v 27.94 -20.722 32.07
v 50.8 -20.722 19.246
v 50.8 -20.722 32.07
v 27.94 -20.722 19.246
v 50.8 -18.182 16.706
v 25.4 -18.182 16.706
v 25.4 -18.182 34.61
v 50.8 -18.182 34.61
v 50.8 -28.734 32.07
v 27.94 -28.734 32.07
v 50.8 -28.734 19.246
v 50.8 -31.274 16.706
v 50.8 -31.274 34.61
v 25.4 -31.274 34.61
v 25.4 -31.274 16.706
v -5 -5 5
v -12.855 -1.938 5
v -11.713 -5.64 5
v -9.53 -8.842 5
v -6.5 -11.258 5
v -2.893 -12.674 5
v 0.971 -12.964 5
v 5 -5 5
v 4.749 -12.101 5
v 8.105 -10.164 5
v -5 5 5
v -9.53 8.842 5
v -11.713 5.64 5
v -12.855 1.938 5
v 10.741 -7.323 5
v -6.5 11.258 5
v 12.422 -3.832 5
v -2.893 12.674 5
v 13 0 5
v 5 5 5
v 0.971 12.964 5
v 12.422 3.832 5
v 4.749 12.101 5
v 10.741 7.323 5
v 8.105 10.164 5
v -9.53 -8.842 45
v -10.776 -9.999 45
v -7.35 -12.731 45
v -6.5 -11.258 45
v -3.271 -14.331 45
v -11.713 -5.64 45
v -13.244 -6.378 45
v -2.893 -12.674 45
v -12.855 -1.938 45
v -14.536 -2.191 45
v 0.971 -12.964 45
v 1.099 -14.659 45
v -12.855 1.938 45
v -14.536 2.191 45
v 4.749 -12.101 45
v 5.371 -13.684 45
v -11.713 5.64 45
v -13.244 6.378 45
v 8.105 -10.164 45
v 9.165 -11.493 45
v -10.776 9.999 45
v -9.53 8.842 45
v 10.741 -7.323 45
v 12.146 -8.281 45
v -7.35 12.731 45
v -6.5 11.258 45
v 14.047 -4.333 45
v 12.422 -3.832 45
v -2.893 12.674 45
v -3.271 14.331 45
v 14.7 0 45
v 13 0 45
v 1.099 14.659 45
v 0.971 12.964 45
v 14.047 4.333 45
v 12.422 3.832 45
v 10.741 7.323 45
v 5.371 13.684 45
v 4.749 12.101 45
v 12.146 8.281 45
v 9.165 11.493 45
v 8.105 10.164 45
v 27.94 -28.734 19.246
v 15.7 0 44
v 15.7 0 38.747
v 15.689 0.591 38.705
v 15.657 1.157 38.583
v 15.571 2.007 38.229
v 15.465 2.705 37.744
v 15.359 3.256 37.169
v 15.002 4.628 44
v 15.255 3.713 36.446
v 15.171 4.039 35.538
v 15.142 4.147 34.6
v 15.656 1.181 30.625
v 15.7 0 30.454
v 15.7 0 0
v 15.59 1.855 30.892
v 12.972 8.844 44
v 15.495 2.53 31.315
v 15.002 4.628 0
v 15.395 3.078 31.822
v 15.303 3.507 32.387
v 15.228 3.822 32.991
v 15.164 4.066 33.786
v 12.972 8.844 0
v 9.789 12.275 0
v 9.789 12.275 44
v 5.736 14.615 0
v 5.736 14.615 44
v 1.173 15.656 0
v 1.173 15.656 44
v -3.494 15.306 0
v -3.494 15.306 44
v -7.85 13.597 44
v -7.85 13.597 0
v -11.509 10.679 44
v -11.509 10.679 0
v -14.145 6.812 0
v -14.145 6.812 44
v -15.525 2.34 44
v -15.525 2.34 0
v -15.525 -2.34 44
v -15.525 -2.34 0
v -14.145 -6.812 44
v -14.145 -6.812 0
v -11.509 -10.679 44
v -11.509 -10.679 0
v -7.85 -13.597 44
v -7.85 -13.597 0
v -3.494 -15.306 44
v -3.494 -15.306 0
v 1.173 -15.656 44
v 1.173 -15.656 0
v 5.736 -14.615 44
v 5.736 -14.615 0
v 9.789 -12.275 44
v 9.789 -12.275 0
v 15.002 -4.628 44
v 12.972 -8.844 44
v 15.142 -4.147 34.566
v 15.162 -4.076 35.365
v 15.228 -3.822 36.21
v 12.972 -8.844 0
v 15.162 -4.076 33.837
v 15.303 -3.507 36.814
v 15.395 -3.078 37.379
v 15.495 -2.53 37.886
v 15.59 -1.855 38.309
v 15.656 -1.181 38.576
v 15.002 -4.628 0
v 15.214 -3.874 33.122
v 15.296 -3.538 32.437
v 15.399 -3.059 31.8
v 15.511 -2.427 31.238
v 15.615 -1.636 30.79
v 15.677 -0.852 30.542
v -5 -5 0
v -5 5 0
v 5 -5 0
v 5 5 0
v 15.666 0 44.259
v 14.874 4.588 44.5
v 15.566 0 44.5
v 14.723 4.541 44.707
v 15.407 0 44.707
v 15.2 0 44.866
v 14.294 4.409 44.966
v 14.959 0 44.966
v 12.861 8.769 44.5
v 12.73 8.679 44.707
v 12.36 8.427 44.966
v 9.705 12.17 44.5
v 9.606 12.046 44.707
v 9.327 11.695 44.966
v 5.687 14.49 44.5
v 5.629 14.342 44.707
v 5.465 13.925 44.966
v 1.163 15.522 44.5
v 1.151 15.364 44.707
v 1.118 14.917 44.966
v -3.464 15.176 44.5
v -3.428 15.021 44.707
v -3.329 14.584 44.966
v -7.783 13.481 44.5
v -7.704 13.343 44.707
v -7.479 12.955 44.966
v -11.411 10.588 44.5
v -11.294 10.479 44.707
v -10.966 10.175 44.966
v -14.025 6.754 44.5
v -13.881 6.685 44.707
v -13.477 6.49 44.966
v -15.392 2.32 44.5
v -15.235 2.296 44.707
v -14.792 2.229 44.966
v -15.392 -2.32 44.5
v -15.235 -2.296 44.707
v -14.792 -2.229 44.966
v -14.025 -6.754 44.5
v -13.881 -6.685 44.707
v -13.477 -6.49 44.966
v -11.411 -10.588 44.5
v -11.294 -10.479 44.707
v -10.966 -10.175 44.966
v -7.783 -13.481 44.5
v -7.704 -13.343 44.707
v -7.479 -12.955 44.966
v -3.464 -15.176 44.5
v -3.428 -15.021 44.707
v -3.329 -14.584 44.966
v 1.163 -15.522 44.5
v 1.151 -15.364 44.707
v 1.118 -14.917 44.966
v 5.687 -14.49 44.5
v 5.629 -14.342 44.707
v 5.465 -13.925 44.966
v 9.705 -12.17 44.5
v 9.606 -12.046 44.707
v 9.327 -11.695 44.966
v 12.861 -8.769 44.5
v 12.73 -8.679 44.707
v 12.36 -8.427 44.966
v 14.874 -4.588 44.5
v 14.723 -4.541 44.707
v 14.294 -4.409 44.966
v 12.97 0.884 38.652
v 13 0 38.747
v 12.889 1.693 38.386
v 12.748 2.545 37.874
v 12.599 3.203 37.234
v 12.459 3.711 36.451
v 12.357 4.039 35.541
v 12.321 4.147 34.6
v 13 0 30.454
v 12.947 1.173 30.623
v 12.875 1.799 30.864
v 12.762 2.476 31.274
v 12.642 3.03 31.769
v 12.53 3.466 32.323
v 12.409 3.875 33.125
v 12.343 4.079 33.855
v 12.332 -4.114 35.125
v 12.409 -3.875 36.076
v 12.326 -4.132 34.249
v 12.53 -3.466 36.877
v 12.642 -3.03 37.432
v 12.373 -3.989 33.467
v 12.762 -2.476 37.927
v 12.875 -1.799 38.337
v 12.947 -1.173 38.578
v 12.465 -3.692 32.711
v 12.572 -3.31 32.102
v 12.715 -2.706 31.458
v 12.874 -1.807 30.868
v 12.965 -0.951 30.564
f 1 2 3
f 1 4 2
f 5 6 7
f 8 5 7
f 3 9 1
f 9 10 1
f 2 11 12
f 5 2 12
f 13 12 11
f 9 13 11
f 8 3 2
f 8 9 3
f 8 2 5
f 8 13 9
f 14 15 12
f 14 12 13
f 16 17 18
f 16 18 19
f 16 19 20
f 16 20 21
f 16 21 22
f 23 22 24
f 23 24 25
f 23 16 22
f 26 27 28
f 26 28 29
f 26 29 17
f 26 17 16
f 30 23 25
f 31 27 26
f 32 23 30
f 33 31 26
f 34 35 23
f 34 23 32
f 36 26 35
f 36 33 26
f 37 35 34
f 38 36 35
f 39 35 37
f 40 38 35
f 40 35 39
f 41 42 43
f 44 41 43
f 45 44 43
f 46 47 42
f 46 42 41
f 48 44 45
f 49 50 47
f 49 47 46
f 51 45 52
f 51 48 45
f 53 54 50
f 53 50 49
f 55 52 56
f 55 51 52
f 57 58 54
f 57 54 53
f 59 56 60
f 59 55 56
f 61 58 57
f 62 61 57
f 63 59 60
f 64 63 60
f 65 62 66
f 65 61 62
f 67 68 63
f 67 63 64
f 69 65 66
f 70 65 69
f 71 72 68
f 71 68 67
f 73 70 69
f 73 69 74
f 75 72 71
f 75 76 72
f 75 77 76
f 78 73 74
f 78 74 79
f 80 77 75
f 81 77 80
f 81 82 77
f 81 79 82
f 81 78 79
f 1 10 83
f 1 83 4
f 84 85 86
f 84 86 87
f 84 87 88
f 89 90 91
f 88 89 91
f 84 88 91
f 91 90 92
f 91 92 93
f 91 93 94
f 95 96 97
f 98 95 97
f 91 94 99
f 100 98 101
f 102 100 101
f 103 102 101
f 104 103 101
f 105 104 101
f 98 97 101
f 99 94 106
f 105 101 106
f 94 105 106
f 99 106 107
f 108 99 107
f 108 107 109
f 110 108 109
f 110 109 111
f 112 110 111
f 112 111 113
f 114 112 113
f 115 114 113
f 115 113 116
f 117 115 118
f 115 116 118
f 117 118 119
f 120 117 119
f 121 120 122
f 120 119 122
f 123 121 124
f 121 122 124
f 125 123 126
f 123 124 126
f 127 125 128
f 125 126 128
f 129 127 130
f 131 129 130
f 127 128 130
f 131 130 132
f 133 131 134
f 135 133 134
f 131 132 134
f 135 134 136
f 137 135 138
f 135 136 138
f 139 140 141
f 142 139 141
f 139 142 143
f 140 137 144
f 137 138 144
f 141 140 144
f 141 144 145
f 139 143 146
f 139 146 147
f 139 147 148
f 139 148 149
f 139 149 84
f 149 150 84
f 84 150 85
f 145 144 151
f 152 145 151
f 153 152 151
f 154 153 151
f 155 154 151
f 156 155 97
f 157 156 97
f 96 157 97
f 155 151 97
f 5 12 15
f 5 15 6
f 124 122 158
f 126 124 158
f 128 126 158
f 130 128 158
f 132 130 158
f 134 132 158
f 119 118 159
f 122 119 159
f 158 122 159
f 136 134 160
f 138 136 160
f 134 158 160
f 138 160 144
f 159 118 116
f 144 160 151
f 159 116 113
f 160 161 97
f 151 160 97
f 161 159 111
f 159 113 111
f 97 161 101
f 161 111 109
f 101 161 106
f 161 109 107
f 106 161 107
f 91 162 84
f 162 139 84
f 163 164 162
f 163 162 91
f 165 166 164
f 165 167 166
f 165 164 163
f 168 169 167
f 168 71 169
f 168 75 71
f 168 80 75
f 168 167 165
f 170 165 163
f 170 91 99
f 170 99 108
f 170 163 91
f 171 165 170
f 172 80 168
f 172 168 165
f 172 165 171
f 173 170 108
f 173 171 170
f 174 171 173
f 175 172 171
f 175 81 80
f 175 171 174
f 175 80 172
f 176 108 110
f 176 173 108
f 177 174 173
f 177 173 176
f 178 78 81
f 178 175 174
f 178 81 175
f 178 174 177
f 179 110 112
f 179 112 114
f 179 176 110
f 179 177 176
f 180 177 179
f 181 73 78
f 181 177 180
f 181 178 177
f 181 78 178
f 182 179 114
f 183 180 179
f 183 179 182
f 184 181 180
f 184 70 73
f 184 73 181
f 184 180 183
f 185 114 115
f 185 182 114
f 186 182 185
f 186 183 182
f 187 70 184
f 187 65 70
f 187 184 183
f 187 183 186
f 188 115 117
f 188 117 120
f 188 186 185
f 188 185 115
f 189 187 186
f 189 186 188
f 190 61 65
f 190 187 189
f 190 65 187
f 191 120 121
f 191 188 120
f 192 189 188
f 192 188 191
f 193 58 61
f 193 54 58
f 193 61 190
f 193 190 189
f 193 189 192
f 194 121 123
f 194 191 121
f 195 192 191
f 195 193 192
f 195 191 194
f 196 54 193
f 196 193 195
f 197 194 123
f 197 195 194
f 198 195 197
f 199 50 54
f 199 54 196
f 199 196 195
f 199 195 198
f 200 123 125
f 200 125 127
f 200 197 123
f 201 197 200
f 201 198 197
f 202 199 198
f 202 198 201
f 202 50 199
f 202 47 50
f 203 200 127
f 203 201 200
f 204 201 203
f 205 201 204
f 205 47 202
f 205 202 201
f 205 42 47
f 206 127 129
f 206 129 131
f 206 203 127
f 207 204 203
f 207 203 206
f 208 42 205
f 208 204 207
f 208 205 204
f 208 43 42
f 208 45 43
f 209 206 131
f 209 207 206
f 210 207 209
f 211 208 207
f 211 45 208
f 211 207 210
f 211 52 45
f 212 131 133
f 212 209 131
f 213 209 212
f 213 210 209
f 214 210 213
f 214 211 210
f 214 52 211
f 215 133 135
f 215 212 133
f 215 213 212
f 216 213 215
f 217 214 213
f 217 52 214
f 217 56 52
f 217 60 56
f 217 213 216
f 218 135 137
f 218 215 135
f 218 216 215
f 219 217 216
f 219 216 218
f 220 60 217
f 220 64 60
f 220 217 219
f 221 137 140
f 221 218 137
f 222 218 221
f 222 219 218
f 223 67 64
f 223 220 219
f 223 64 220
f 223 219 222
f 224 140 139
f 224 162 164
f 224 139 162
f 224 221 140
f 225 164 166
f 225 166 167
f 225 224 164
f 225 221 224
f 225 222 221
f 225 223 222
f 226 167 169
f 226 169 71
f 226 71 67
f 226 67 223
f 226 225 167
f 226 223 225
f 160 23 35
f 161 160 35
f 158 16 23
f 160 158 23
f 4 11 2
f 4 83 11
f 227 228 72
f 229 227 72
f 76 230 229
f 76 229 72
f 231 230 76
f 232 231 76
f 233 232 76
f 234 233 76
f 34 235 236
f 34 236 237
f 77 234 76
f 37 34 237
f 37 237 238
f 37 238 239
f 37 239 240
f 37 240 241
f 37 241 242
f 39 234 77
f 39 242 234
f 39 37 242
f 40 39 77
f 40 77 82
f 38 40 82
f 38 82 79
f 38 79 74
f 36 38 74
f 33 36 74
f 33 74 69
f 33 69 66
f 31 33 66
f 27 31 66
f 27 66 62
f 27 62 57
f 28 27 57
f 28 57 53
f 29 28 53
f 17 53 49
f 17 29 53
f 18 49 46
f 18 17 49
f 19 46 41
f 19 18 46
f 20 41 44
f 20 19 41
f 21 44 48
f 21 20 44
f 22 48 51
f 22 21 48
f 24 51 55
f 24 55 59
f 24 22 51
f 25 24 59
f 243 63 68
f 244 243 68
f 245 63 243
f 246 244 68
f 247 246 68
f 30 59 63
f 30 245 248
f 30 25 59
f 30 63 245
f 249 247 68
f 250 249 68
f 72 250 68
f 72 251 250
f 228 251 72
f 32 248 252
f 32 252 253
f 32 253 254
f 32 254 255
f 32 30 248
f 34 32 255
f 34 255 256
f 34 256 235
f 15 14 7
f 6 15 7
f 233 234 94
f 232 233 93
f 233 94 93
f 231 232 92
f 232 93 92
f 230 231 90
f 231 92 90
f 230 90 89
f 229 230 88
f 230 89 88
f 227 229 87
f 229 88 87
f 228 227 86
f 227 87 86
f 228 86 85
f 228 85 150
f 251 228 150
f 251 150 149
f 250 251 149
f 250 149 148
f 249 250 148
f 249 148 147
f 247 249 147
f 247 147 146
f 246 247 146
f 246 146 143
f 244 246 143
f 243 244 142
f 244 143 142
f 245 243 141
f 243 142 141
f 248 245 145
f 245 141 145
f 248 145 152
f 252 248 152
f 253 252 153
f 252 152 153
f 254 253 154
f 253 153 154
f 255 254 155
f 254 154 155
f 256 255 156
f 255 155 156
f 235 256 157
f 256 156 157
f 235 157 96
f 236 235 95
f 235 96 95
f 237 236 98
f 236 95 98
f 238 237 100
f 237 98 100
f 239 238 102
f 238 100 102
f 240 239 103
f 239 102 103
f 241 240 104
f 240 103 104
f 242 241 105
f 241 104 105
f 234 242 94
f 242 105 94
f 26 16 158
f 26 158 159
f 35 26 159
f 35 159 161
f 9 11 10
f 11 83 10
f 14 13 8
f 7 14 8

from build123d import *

# Parameters (mm, degrees)
F0_R      = 15.7
F1_DEPTH  = 5
F2_R      = 15.7
F2_R_2    = 13
F3_DEPTH  = 40
F4_W      = 10
F4_H      = 10
F5_DEPTH  = 25.4
F6_R      = 1
F8_R      = 4.146838
F9_DEPTH  = 25.4
F10_W     = 13.092702
F10_H     = 17.904548
F11_DEPTH = 25.4
F12_T     = -2.54


with BuildPart() as f1:
    # F0 (on Top) → F1 (new body)
    with BuildSketch(Plane.XY):
        Circle(F0_R)
    extrude(amount=F1_DEPTH)

    # F2 (on face) → F3 (join)
    with BuildSketch(Plane.XY.offset(5)):
        Circle(F2_R)
        Circle(F2_R_2, mode=Mode.SUBTRACT)
    extrude(amount=F3_DEPTH)

    # F4 (on face) → F5 (cut)
    with BuildSketch(Plane.XY.offset(5)):
        Rectangle(F4_W, F4_H)
    extrude(amount=-F5_DEPTH, mode=Mode.SUBTRACT)

    # F6
    f6_edges = [f1.edges().sort_by_distance(p)[0] for p in [
        (-15.7, 0, 45),
    ]]
    fillet(f6_edges, radius=F6_R)

    # F8 (on offset) → F9 (cut)
    with BuildSketch(Plane.YZ.offset(25.4)):
        with Locations((0, 34.600358)):
            Circle(F8_R)
    extrude(amount=-F9_DEPTH, mode=Mode.SUBTRACT)


with BuildPart() as f11:
    # F10 (on offset) → F11 (new body)
    with BuildSketch(Plane.YZ.offset(25.4)):
        with Locations((-24.727923, 25.658214)):
            Rectangle(F10_W, F10_H)
    extrude(amount=F11_DEPTH)

    # F12
    f12_openings = [f11.faces().sort_by_distance(p)[0] for p in [
        (50.8, -24.727923, 25.658214),
    ]]
    offset(amount=F12_T, openings=f12_openings)


solid = Compound([f1.part, f11.part])
